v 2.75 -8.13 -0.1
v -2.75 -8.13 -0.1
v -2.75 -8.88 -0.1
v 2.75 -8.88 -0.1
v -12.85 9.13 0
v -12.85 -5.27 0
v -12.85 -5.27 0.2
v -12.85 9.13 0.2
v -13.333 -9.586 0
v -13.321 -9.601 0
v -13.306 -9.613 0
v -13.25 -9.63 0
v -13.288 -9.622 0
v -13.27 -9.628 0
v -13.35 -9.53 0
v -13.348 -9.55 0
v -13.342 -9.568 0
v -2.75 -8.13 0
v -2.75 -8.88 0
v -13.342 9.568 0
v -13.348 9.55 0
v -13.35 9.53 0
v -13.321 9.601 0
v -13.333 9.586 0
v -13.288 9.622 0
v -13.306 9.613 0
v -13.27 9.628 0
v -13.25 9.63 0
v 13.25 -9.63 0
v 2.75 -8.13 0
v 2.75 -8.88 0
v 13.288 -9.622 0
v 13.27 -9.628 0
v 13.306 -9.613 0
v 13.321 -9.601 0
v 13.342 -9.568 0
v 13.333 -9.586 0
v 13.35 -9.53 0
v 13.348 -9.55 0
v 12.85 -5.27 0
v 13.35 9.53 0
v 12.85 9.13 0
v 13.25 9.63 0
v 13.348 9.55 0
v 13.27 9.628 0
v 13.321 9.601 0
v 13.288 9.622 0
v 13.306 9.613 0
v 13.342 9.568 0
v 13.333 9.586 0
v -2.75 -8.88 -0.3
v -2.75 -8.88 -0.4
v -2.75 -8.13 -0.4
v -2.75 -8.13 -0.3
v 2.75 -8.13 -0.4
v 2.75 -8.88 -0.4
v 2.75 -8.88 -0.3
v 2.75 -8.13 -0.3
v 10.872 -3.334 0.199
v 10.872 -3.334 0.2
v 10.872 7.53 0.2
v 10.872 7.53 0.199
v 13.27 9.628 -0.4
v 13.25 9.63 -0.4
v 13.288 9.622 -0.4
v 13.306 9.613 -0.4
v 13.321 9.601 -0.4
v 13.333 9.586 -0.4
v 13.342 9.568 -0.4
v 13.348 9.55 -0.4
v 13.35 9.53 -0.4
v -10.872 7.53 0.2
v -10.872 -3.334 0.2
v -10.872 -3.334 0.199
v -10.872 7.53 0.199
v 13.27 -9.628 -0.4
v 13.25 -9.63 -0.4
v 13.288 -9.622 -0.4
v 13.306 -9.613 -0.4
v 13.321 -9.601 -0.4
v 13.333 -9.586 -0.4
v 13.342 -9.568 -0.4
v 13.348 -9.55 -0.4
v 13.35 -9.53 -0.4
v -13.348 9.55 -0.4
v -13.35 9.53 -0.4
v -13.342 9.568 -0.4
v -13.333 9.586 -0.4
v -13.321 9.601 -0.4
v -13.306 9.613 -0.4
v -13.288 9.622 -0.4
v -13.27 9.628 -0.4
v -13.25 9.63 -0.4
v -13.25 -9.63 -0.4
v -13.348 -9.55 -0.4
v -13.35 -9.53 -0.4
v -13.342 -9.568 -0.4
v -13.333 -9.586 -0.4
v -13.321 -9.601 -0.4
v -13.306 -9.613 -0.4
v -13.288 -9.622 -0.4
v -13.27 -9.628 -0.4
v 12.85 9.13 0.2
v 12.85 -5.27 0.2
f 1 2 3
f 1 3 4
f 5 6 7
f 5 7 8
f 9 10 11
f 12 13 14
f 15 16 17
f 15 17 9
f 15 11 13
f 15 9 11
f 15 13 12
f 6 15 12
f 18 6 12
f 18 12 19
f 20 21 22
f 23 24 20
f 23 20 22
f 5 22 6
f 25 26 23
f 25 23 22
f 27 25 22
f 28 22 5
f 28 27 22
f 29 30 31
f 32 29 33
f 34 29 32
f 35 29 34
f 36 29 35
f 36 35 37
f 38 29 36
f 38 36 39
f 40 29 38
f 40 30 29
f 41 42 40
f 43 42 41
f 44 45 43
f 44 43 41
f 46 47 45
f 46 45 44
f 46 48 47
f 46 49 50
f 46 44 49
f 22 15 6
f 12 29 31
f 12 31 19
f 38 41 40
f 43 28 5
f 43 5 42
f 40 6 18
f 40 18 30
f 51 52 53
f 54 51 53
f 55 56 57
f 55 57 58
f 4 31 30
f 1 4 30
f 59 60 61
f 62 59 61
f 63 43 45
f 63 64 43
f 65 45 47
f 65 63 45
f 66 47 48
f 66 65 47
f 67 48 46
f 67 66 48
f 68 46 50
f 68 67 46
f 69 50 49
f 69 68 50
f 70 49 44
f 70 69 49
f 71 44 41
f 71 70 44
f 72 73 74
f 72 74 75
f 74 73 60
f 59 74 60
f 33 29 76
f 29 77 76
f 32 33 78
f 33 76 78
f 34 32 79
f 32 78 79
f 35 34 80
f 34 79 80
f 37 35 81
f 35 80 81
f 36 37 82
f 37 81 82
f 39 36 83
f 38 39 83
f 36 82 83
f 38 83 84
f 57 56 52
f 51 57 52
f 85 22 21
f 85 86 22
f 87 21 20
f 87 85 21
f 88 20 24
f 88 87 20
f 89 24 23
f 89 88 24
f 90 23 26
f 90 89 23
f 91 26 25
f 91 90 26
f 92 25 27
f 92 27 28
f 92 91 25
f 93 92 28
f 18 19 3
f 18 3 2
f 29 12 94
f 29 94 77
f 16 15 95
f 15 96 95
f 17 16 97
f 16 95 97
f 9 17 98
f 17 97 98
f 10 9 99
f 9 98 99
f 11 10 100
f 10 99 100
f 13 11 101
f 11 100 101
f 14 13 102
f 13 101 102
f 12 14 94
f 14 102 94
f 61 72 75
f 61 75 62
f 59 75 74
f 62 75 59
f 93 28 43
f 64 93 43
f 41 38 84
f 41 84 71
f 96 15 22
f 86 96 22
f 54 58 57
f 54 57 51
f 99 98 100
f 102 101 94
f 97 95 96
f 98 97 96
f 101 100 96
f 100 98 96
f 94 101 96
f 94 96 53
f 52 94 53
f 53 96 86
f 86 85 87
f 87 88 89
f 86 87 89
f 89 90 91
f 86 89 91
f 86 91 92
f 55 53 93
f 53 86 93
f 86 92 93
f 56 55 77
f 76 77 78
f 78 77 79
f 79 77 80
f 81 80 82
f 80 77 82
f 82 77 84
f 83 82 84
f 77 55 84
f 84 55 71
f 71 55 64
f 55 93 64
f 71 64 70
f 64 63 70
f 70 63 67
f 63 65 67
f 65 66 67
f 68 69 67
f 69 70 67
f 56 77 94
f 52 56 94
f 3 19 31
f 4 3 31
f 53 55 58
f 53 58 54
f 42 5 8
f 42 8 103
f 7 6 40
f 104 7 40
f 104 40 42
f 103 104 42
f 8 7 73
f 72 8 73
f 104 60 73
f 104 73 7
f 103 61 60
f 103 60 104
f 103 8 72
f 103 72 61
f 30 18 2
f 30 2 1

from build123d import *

# Parameters (mm, degrees)
SKETCH3_W           = 26.7
SKETCH3_H           = 19.26
BOSS_EXTRUDE1_DEPTH = 0.4
SKETCH5_W           = 25.7
SKETCH5_H           = 14.4
BOSS_EXTRUDE3_DEPTH = 0.2
SKETCH6_W           = 21.744
SKETCH6_H           = 10.864
CUT_EXTRUDE1_DEPTH  = 0.001
FILLET1_R           = 0.1
SKETCH7_W           = 5.5
SKETCH7_H           = 0.75
CUT_EXTRUDE2_DEPTH  = 0.1
SKETCH8_W           = 5.5
SKETCH8_H           = 0.75
CUT_EXTRUDE3_DEPTH  = 0.1


with BuildPart() as part:
    # Sketch3 → Boss-Extrude1 (new body)
    with BuildSketch(Plane.XY):
        Rectangle(SKETCH3_W, SKETCH3_H)
    extrude(amount=-BOSS_EXTRUDE1_DEPTH)

    # Sketch5 → Boss-Extrude3 (add)
    with BuildSketch(Plane.XY):
        with Locations((0, 1.93)):
            Rectangle(SKETCH5_W, SKETCH5_H)
    extrude(amount=BOSS_EXTRUDE3_DEPTH)

    # Sketch6 → Cut-Extrude1 (cut)
    with BuildSketch(Plane.XY.offset(0.2)):
        with Locations((0, 2.098)):
            Rectangle(SKETCH6_W, SKETCH6_H)
    extrude(amount=-CUT_EXTRUDE1_DEPTH, mode=Mode.SUBTRACT)

    # Fillet1
    fillet1_edges = [part.edges().sort_by_distance(p)[0] for p in [
        (13.35, -9.63, -0.2),
        (-13.35, -9.63, -0.2),
        (-13.35, 9.63, -0.2),
        (13.35, 9.63, -0.2),
    ]]
    fillet(fillet1_edges, radius=FILLET1_R)

    # Sketch7 → Cut-Extrude2 (cut)
    with BuildSketch(Plane.XY):
        with Locations((0, -8.505)):
            Rectangle(SKETCH7_W, SKETCH7_H)
    extrude(amount=-CUT_EXTRUDE2_DEPTH, mode=Mode.SUBTRACT)

    # Sketch8 → Cut-Extrude3 (cut)
    with BuildSketch(Plane(origin=(0, 0, -0.4), x_dir=(-1, 0, 0), z_dir=(0, 0, -1))):
        with Locations((0, -8.505)):
            Rectangle(SKETCH8_W, SKETCH8_H)
    extrude(amount=-CUT_EXTRUDE3_DEPTH, mode=Mode.SUBTRACT)


solid = part.part
